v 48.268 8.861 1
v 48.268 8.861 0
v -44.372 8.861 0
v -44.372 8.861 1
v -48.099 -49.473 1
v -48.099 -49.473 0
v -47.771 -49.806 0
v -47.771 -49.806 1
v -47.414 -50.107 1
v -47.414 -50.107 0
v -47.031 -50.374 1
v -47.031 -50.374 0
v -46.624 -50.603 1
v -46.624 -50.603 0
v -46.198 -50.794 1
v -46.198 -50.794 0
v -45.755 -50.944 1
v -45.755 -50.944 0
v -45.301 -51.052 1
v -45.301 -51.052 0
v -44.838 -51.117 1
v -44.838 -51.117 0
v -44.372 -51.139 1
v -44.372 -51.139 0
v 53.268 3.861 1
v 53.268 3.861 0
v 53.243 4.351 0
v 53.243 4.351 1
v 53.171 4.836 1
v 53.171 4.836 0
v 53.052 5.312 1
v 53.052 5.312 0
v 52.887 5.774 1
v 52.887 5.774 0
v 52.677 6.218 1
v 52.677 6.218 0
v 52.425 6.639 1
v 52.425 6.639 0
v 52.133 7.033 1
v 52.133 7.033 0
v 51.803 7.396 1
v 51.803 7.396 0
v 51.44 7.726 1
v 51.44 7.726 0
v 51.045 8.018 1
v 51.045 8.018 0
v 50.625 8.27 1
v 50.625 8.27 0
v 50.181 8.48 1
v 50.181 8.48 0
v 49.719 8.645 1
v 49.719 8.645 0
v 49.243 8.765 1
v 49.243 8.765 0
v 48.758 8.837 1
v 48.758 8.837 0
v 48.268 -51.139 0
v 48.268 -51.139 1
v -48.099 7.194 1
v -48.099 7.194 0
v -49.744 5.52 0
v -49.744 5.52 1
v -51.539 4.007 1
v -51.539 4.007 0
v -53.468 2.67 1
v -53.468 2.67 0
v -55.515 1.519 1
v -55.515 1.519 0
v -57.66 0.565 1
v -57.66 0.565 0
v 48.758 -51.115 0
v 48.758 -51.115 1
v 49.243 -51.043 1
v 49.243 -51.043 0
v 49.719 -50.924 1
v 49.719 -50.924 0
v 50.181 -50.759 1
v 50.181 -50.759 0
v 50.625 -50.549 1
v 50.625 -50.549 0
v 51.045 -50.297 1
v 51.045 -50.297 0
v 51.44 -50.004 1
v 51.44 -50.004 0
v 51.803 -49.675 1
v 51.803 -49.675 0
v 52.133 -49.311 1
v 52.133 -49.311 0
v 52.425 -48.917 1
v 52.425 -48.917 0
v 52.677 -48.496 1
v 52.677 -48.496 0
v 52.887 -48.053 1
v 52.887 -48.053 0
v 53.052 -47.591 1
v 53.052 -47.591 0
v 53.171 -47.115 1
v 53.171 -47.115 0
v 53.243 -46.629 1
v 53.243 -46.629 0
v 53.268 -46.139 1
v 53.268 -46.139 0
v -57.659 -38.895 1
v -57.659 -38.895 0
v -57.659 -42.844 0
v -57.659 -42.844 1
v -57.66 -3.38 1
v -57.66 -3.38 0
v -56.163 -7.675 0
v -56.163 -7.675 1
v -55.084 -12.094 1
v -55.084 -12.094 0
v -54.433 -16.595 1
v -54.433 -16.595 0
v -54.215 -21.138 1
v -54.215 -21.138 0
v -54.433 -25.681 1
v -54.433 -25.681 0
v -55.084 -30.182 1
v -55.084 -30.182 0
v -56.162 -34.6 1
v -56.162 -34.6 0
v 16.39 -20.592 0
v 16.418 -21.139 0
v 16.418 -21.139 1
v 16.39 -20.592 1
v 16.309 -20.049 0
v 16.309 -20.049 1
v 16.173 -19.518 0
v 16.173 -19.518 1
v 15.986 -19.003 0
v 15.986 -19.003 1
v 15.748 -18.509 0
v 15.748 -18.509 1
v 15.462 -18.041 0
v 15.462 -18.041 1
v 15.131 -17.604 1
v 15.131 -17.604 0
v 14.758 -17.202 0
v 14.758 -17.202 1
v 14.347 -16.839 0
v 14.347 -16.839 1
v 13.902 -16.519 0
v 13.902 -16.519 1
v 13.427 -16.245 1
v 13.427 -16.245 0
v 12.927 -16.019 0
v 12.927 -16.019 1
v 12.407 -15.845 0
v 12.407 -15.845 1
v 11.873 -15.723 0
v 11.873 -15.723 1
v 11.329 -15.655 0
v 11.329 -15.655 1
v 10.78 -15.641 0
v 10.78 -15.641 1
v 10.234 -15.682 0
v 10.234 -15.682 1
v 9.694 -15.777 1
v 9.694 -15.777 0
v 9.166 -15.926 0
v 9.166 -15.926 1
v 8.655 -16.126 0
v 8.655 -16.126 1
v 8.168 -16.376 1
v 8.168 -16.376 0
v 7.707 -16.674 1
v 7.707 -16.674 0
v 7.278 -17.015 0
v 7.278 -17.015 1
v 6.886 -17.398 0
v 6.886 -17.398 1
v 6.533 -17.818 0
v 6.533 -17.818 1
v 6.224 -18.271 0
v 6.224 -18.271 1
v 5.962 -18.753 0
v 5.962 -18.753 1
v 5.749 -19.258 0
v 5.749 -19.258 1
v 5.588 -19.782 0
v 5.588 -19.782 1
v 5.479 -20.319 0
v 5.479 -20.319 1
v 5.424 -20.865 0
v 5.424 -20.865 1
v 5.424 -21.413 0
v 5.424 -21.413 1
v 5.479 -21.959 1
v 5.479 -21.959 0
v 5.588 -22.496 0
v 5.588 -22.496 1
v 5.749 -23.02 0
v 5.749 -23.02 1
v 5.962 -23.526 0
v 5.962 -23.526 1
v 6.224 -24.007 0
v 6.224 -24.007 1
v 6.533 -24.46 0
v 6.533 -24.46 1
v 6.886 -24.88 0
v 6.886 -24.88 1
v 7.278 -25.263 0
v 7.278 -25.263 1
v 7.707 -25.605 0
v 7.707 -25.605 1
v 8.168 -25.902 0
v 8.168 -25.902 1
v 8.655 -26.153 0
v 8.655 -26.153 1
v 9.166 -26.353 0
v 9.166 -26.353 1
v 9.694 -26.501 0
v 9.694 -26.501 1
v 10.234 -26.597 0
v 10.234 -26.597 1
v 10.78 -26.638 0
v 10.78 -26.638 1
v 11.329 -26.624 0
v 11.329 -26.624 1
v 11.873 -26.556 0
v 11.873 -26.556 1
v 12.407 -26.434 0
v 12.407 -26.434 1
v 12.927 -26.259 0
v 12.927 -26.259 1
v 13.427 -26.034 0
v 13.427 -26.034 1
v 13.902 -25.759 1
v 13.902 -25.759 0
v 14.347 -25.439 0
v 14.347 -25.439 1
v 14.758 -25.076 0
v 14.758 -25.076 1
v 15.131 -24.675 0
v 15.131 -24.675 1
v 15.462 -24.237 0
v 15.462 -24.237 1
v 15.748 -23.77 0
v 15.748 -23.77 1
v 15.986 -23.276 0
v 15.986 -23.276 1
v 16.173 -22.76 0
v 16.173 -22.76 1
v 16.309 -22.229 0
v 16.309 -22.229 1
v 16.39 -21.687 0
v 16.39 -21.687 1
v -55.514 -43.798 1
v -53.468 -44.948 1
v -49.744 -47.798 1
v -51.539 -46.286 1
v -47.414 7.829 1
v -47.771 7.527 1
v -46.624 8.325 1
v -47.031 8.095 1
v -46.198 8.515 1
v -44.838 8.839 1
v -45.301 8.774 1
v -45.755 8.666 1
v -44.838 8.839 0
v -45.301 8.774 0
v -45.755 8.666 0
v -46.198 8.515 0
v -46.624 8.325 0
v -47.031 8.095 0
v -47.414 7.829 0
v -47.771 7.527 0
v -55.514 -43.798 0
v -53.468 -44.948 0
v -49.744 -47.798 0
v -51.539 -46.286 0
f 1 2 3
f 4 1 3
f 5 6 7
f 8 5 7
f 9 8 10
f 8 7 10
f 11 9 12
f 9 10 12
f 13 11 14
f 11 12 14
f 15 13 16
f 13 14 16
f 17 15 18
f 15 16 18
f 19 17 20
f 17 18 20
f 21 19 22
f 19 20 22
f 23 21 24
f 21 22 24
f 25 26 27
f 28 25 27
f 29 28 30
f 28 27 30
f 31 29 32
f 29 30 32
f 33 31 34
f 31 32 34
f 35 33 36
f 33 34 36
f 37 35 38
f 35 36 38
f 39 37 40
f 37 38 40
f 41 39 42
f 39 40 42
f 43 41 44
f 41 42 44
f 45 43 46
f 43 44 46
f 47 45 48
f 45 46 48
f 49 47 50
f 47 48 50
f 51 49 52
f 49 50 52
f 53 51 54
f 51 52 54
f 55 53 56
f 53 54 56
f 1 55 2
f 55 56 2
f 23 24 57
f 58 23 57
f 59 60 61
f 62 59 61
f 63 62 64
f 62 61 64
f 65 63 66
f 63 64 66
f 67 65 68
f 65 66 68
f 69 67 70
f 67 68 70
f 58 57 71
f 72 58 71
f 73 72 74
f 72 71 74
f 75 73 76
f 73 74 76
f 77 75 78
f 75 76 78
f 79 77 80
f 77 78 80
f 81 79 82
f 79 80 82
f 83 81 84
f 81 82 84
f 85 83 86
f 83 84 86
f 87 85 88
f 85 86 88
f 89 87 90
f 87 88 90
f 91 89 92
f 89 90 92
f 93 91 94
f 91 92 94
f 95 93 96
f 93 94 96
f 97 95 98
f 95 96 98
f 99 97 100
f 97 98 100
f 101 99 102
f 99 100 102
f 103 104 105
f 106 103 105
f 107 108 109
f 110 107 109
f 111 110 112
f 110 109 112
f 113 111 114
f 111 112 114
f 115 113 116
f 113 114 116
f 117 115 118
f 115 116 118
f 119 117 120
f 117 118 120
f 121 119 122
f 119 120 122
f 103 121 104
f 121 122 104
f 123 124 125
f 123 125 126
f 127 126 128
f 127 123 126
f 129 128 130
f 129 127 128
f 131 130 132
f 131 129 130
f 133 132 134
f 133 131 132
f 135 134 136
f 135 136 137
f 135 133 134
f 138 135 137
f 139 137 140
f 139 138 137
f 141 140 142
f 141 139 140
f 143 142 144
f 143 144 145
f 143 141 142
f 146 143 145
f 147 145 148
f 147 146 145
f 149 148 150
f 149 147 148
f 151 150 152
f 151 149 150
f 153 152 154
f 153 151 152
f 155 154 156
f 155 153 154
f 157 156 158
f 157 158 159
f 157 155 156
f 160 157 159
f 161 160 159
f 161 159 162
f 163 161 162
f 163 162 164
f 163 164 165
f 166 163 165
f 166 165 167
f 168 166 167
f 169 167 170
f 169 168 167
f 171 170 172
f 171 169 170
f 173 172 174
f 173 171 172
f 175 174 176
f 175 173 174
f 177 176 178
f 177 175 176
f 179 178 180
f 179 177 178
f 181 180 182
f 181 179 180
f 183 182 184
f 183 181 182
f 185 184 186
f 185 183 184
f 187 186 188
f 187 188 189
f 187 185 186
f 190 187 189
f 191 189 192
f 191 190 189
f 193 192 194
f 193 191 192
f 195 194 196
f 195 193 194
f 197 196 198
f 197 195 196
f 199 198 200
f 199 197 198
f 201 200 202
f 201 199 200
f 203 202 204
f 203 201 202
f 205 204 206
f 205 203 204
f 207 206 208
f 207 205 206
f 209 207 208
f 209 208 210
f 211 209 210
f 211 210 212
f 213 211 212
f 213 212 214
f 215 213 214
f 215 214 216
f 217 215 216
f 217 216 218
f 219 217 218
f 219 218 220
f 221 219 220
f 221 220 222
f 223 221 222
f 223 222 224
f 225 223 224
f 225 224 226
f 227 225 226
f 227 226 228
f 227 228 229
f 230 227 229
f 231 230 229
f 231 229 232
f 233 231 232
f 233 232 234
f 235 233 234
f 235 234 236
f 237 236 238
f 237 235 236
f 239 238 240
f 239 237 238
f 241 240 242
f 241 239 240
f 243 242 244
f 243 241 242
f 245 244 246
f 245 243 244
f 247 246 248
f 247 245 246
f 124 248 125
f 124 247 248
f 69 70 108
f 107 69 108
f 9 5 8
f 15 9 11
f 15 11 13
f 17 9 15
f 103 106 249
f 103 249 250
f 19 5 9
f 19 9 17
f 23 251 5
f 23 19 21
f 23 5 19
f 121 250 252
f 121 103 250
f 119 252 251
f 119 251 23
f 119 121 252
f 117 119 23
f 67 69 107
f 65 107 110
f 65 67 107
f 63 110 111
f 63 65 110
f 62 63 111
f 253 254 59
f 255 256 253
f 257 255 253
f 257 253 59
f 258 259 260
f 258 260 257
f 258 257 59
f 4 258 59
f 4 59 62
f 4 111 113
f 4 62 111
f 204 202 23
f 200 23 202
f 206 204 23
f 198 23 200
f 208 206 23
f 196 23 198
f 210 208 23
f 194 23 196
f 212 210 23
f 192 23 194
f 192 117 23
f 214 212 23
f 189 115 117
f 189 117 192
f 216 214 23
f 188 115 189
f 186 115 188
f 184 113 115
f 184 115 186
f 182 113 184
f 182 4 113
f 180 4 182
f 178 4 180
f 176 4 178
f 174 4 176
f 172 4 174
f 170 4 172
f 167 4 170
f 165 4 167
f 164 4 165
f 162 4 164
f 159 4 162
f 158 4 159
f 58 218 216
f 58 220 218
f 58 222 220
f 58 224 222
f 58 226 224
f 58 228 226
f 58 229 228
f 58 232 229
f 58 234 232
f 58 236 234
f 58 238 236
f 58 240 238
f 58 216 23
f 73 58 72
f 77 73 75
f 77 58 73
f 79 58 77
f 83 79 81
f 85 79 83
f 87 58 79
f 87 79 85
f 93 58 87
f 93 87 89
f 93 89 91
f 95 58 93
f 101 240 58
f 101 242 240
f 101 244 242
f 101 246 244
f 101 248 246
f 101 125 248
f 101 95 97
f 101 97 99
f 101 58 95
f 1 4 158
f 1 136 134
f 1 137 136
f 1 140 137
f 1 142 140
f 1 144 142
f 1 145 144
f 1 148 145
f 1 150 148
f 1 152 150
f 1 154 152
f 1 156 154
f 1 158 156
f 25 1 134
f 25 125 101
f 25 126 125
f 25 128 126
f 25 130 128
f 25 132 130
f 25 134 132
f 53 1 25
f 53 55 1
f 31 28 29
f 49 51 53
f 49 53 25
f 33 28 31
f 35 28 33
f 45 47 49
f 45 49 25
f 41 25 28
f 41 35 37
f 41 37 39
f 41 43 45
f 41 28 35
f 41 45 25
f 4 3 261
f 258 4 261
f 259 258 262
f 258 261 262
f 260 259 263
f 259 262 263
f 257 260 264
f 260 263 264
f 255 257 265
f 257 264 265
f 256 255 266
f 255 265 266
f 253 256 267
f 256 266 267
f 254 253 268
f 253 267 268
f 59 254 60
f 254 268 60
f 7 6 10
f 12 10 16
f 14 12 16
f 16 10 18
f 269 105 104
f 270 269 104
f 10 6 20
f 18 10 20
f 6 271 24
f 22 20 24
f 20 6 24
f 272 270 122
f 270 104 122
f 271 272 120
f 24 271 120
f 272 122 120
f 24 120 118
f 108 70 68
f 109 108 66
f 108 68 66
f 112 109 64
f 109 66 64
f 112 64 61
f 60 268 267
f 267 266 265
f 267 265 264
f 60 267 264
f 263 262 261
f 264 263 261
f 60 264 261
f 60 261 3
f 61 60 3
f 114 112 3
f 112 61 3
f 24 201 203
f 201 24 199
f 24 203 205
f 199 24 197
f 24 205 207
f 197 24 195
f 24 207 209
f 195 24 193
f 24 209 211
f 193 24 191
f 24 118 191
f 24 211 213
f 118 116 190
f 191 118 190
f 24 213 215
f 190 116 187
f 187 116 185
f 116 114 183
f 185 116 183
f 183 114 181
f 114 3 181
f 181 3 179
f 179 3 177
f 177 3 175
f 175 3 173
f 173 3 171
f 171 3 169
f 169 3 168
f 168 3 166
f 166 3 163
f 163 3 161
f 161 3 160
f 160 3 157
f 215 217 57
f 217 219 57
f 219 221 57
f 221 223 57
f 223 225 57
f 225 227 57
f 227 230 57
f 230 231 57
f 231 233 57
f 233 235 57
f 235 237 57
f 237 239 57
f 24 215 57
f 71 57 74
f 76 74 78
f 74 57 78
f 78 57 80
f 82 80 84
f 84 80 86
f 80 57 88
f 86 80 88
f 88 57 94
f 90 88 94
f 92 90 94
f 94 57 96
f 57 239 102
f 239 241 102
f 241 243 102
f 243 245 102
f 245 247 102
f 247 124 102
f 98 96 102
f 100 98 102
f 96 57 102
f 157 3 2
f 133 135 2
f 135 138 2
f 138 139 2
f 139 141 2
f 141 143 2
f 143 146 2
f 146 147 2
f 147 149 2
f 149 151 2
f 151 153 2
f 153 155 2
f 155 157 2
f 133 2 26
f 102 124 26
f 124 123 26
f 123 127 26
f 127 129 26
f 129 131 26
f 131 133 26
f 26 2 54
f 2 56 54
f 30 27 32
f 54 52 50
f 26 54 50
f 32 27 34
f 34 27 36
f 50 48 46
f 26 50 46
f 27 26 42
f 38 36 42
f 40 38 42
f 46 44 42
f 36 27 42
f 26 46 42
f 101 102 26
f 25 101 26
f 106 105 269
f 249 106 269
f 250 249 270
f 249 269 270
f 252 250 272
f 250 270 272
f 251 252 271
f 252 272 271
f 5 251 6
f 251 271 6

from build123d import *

# Parameters (mm, degrees)
F0_R     = 1.25
F0_R_2   = 5.5
F0_R_3   = 5
F1_DEPTH = 1


with BuildPart() as f1:
    # F0 (on Top) → F1 (new body)
    with BuildSketch(Plane.XY):
        with BuildLine():
            Line((48.267568, 8.860779), (-44.371753, 8.860779))
            ThreePointArc((-44.371753, 8.860779), (-46.412994, 8.425134), (-48.098533, 7.194113))
            ThreePointArc((-48.098533, 7.194113), (-52.488118, 3.315719), (-57.659668, 0.56518))
            Line((-57.659668, 0.56518), (-57.659668, -3.380423))
            ThreePointArc((-57.659668, -3.380423), (-54.215032, -21.137683), (-57.658519, -38.895166))
            Line((-57.658519, -38.895166), (-57.658519, -42.844069))
            ThreePointArc((-57.658519, -42.844069), (-52.487611, -45.594512), (-48.098533, -49.472554))
            ThreePointArc((-48.098533, -49.472554), (-46.412994, -50.703575), (-44.371753, -51.139221))
            Line((-44.371753, -51.139221), (48.267568, -51.139221))
            ThreePointArc((48.267568, -51.139221), (51.803101, -49.674755), (53.267568, -46.139221))
            Line((53.267568, -46.139221), (53.267568, -22.439221))
            Line((53.267568, -22.439221), (46.782555, -22.439221))
            ThreePointArc((46.782555, -22.439221), (45.636911, -22.799861), (44.904433, -23.751721))
            ThreePointArc((44.904433, -23.751721), (37.767568, -28.739221), (30.630702, -23.751721))
            ThreePointArc((30.630702, -23.751721), (29.898224, -22.799861), (28.75258, -22.439221))
            Line((28.75258, -22.439221), (22.267568, -22.439221))
            Line((22.267568, -22.439221), (22.267568, -36.139221))
            Line((22.267568, -36.139221), (11.842568, -36.139221))
            Line((11.842568, -36.139221), (11.842568, -38.439221))
            ThreePointArc((11.842568, -38.439221), (7.156568, -42.753221), (2.842568, -38.067221))
            Line((2.842568, -38.067221), (2.842568, -36.139221))
            Line((2.842568, -36.139221), (-22.307432, -36.139221))
            Line((-22.307432, -36.139221), (-22.307432, -38.067221))
            ThreePointArc((-22.307432, -38.067221), (-26.621432, -42.753221), (-31.307432, -38.439221))
            Line((-31.307432, -38.439221), (-31.307432, -36.139221))
            Line((-31.307432, -36.139221), (-41.732432, -36.139221))
            Line((-41.732432, -36.139221), (-41.732432, -6.139221))
            Line((-41.732432, -6.139221), (-31.307432, -6.139221))
            Line((-31.307432, -6.139221), (-31.307432, -3.839221))
            ThreePointArc((-31.307432, -3.839221), (-26.621432, 0.474779), (-22.307432, -4.211221))
            Line((-22.307432, -4.211221), (-22.307432, -6.139221))
            Line((-22.307432, -6.139221), (2.842568, -6.139221))
            Line((2.842568, -6.139221), (2.842568, -4.211221))
            ThreePointArc((2.842568, -4.211221), (7.156568, 0.474779), (11.842568, -3.839221))
            Line((11.842568, -3.839221), (11.842568, -6.139221))
            Line((11.842568, -6.139221), (22.267568, -6.139221))
            Line((22.267568, -6.139221), (22.267568, -19.839221))
            Line((22.267568, -19.839221), (28.75258, -19.839221))
            ThreePointArc((28.75258, -19.839221), (29.898224, -19.47858), (30.630702, -18.526721))
            ThreePointArc((30.630702, -18.526721), (37.767568, -13.539221), (44.904433, -18.526721))
            ThreePointArc((44.904433, -18.526721), (45.636911, -19.47858), (46.782555, -19.839221))
            Line((46.782555, -19.839221), (53.267568, -19.839221))
            Line((53.267568, -19.839221), (53.267568, 3.860779))
            ThreePointArc((53.267568, 3.860779), (51.803101, 7.396313), (48.267568, 8.860779))
        make_face()
        with Locations((-38.380432, -42.839221)):
            Circle(F0_R, mode=Mode.SUBTRACT)
        with Locations((37.767568, -42.839221)):
            Circle(F0_R, mode=Mode.SUBTRACT)
        with Locations((-38.380432, 0.560779)):
            Circle(F0_R, mode=Mode.SUBTRACT)
        with Locations((37.767568, 0.560779)):
            Circle(F0_R, mode=Mode.SUBTRACT)
        with BuildLine():
            Line((22.267568, -21.139221), (22.267568, -19.839221))
            Line((22.267568, -19.839221), (22.267568, -6.139221))
            Line((22.267568, -6.139221), (11.842568, -6.139221))
            Line((11.842568, -6.139221), (11.842568, -3.839221))
            ThreePointArc((11.842568, -3.839221), (7.156568, 0.474779), (2.842568, -4.211221))
            Line((2.842568, -4.211221), (2.842568, -6.139221))
            Line((2.842568, -6.139221), (-22.307432, -6.139221))
            Line((-22.307432, -6.139221), (-22.307432, -4.211221))
            ThreePointArc((-22.307432, -4.211221), (-26.621432, 0.474779), (-31.307432, -3.839221))
            Line((-31.307432, -3.839221), (-31.307432, -6.139221))
            Line((-31.307432, -6.139221), (-41.732432, -6.139221))
            Line((-41.732432, -6.139221), (-41.732432, -36.139221))
            Line((-41.732432, -36.139221), (-31.307432, -36.139221))
            Line((-31.307432, -36.139221), (-31.307432, -38.439221))
            ThreePointArc((-31.307432, -38.439221), (-26.621432, -42.753221), (-22.307432, -38.067221))
            Line((-22.307432, -38.067221), (-22.307432, -36.139221))
            Line((-22.307432, -36.139221), (2.842568, -36.139221))
            Line((2.842568, -36.139221), (2.842568, -38.067221))
            ThreePointArc((2.842568, -38.067221), (7.156568, -42.753221), (11.842568, -38.439221))
            Line((11.842568, -38.439221), (11.842568, -36.139221))
            Line((11.842568, -36.139221), (22.267568, -36.139221))
            Line((22.267568, -36.139221), (22.267568, -22.439221))
            Line((22.267568, -22.439221), (22.267568, -21.139221))
        make_face()
        with Locations((10.917568, -21.139221)):
            Circle(F0_R_2, mode=Mode.SUBTRACT)
        with BuildLine():
            Line((53.267568, -22.439221), (53.267568, -19.839221))
            Line((53.267568, -19.839221), (46.782555, -19.839221))
            ThreePointArc((46.782555, -19.839221), (45.636911, -19.47858), (44.904433, -18.526721))
            ThreePointArc((44.904433, -18.526721), (37.767568, -13.539221), (30.630702, -18.526721))
            ThreePointArc((30.630702, -18.526721), (29.898224, -19.47858), (28.75258, -19.839221))
            Line((28.75258, -19.839221), (22.267568, -19.839221))
            Line((22.267568, -19.839221), (22.267568, -21.139221))
            Line((22.267568, -21.139221), (22.267568, -22.439221))
            Line((22.267568, -22.439221), (28.75258, -22.439221))
            ThreePointArc((28.75258, -22.439221), (29.898224, -22.799861), (30.630702, -23.751721))
            ThreePointArc((30.630702, -23.751721), (37.767568, -28.739221), (44.904433, -23.751721))
            ThreePointArc((44.904433, -23.751721), (45.636911, -22.799861), (46.782555, -22.439221))
            Line((46.782555, -22.439221), (53.267568, -22.439221))
        make_face()
        with Locations((37.767568, -21.139221)):
            Circle(F0_R_3, mode=Mode.SUBTRACT)
        with Locations((37.767568, -21.139221)):
            Circle(F0_R_3)
        with Locations((37.767568, 0.560779)):
            Circle(F0_R)
        with Locations((37.767568, -42.839221)):
            Circle(F0_R)
        with Locations((-38.380432, -42.839221)):
            Circle(F0_R)
        with Locations((-38.380432, 0.560779)):
            Circle(F0_R)
    extrude(amount=F1_DEPTH)


solid = f1.part
